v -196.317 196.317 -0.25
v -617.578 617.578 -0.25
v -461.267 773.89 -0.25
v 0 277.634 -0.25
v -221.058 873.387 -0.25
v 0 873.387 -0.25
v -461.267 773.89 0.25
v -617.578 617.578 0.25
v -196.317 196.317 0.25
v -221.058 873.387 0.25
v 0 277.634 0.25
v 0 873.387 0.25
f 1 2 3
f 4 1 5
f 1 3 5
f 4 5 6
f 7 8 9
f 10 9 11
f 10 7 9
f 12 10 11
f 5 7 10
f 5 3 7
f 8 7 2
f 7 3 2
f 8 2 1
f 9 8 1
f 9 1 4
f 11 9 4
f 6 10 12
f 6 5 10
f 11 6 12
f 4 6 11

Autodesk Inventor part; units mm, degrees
ref_plane "YZ Plane" through (0, 0, 0) normal (1, 0, 0) x (0, 1, 0)
ref_plane "XZ Plane" through (0, 0, 0) normal (0, 1, 0) x (-1, 0, 0)
ref_plane "XY Plane" through (0, 0, 0) normal (0, 0, 1) x (1, 0, 0)
sketch "Sketch1" plane through (0, 0, 0) normal (0, 0, 1) x (1, 0, 0)
  line L0 (0, 277.6336) -> (196.3166, 196.3166) construction
  line L1 (196.3166, 196.3166) -> (277.6336, 0) construction
  line L2 (277.6336, 0) -> (196.3166, -196.3166) construction
  line L3 (196.3166, -196.3166) -> (0, -277.6336) construction
  line L4 (0, -277.6336) -> (-196.3166, -196.3166) construction
  line L5 (-196.3166, -196.3166) -> (-277.6336, 0) construction
  line L6 (-277.6336, 0) -> (-196.3166, 196.3166) construction
  line L7 (-196.3166, 196.3166) -> (0, 277.6336)
  line L8 (-196.3166, 196.3166) -> (0, 277.6336)
  line L9 (-461.2666, 773.8898) -> (-221.0579, 873.3874)
  line L10 (-98.1583, 236.9751) -> (-341.1623, 823.6386) construction
  line L11 (-221.0579, 873.3874) -> (0, 873.3874)
  line L12 (0, 873.3874) -> (0, 277.6336)
  line L13 (-461.2666, 773.8898) -> (-617.5782, 617.5782)
  line L14 (-617.5782, 617.5782) -> (-196.3166, 196.3166)
  point P0 (0, 0)
  point P1 (0, 0)
  dimension "d0" = 513
  dimension "d2" = 260
  dimension "d3" = 635
extrude "Extrusion1" add sketch "Sketch1" along normal mid plane 0.5
sketch "Sketch7" plane through (0, 0, 0.25) normal (0, 0, 1) x (1, 0, 0)
  line L0 (-13, 868.3874) -> (-5, 868.3874)
  line L1 (-5, 868.3874) -> (-5, 860.3874)
  line L2 (-5, 860.3874) -> (-13, 860.3874)
  line L3 (-13, 860.3874) -> (-13, 868.3874)
  line L4 (0, 873.3874) -> (-221.0579, 873.3874) projected
  line L5 (0, 277.6336) -> (0, 873.3874) projected
  point P0 (0, 0)
  dimension "d54" = 8
  dimension "d55" = 8
  dimension "d56" = 5
  dimension "d57" = 5
extrude "Extrusion5" [suppressed]
pattern_linear "Rectangular Pattern1" [suppressed]
equation "\"d0\" = Барабан_габарит_по_кассетам"
equation "\"d2\" = Кассета_длина_грани"
equation "\"d3\" = Кассета_высота"
equation "\"BendRadius\" = Thickness"
equation "\"BendReliefWidth\" = Thickness"
equation "\"BendReliefDepth\" = 0.5 * Thickness"
equation "\"CornerReliefSize\" = 4 * Thickness"
equation "\"MinimumRemnant\" = 2 * Thickness"
equation "\"TransitionRadius\" = BendRadius"
equation "\"JacobiRadiusSize\" = BendRadius"
equation "\"GapSize\" = Thickness"
equation "\"Барабан_габарит_по_кассетам\" = 513"
equation "\"Кассета_длина_грани\" = 260"
equation "\"Кассета_высота\" = 635"
equation "\"Thickness\" = 0.5"
properties part number "ДМФ 01 57 Сетка кассеты v2.0"
